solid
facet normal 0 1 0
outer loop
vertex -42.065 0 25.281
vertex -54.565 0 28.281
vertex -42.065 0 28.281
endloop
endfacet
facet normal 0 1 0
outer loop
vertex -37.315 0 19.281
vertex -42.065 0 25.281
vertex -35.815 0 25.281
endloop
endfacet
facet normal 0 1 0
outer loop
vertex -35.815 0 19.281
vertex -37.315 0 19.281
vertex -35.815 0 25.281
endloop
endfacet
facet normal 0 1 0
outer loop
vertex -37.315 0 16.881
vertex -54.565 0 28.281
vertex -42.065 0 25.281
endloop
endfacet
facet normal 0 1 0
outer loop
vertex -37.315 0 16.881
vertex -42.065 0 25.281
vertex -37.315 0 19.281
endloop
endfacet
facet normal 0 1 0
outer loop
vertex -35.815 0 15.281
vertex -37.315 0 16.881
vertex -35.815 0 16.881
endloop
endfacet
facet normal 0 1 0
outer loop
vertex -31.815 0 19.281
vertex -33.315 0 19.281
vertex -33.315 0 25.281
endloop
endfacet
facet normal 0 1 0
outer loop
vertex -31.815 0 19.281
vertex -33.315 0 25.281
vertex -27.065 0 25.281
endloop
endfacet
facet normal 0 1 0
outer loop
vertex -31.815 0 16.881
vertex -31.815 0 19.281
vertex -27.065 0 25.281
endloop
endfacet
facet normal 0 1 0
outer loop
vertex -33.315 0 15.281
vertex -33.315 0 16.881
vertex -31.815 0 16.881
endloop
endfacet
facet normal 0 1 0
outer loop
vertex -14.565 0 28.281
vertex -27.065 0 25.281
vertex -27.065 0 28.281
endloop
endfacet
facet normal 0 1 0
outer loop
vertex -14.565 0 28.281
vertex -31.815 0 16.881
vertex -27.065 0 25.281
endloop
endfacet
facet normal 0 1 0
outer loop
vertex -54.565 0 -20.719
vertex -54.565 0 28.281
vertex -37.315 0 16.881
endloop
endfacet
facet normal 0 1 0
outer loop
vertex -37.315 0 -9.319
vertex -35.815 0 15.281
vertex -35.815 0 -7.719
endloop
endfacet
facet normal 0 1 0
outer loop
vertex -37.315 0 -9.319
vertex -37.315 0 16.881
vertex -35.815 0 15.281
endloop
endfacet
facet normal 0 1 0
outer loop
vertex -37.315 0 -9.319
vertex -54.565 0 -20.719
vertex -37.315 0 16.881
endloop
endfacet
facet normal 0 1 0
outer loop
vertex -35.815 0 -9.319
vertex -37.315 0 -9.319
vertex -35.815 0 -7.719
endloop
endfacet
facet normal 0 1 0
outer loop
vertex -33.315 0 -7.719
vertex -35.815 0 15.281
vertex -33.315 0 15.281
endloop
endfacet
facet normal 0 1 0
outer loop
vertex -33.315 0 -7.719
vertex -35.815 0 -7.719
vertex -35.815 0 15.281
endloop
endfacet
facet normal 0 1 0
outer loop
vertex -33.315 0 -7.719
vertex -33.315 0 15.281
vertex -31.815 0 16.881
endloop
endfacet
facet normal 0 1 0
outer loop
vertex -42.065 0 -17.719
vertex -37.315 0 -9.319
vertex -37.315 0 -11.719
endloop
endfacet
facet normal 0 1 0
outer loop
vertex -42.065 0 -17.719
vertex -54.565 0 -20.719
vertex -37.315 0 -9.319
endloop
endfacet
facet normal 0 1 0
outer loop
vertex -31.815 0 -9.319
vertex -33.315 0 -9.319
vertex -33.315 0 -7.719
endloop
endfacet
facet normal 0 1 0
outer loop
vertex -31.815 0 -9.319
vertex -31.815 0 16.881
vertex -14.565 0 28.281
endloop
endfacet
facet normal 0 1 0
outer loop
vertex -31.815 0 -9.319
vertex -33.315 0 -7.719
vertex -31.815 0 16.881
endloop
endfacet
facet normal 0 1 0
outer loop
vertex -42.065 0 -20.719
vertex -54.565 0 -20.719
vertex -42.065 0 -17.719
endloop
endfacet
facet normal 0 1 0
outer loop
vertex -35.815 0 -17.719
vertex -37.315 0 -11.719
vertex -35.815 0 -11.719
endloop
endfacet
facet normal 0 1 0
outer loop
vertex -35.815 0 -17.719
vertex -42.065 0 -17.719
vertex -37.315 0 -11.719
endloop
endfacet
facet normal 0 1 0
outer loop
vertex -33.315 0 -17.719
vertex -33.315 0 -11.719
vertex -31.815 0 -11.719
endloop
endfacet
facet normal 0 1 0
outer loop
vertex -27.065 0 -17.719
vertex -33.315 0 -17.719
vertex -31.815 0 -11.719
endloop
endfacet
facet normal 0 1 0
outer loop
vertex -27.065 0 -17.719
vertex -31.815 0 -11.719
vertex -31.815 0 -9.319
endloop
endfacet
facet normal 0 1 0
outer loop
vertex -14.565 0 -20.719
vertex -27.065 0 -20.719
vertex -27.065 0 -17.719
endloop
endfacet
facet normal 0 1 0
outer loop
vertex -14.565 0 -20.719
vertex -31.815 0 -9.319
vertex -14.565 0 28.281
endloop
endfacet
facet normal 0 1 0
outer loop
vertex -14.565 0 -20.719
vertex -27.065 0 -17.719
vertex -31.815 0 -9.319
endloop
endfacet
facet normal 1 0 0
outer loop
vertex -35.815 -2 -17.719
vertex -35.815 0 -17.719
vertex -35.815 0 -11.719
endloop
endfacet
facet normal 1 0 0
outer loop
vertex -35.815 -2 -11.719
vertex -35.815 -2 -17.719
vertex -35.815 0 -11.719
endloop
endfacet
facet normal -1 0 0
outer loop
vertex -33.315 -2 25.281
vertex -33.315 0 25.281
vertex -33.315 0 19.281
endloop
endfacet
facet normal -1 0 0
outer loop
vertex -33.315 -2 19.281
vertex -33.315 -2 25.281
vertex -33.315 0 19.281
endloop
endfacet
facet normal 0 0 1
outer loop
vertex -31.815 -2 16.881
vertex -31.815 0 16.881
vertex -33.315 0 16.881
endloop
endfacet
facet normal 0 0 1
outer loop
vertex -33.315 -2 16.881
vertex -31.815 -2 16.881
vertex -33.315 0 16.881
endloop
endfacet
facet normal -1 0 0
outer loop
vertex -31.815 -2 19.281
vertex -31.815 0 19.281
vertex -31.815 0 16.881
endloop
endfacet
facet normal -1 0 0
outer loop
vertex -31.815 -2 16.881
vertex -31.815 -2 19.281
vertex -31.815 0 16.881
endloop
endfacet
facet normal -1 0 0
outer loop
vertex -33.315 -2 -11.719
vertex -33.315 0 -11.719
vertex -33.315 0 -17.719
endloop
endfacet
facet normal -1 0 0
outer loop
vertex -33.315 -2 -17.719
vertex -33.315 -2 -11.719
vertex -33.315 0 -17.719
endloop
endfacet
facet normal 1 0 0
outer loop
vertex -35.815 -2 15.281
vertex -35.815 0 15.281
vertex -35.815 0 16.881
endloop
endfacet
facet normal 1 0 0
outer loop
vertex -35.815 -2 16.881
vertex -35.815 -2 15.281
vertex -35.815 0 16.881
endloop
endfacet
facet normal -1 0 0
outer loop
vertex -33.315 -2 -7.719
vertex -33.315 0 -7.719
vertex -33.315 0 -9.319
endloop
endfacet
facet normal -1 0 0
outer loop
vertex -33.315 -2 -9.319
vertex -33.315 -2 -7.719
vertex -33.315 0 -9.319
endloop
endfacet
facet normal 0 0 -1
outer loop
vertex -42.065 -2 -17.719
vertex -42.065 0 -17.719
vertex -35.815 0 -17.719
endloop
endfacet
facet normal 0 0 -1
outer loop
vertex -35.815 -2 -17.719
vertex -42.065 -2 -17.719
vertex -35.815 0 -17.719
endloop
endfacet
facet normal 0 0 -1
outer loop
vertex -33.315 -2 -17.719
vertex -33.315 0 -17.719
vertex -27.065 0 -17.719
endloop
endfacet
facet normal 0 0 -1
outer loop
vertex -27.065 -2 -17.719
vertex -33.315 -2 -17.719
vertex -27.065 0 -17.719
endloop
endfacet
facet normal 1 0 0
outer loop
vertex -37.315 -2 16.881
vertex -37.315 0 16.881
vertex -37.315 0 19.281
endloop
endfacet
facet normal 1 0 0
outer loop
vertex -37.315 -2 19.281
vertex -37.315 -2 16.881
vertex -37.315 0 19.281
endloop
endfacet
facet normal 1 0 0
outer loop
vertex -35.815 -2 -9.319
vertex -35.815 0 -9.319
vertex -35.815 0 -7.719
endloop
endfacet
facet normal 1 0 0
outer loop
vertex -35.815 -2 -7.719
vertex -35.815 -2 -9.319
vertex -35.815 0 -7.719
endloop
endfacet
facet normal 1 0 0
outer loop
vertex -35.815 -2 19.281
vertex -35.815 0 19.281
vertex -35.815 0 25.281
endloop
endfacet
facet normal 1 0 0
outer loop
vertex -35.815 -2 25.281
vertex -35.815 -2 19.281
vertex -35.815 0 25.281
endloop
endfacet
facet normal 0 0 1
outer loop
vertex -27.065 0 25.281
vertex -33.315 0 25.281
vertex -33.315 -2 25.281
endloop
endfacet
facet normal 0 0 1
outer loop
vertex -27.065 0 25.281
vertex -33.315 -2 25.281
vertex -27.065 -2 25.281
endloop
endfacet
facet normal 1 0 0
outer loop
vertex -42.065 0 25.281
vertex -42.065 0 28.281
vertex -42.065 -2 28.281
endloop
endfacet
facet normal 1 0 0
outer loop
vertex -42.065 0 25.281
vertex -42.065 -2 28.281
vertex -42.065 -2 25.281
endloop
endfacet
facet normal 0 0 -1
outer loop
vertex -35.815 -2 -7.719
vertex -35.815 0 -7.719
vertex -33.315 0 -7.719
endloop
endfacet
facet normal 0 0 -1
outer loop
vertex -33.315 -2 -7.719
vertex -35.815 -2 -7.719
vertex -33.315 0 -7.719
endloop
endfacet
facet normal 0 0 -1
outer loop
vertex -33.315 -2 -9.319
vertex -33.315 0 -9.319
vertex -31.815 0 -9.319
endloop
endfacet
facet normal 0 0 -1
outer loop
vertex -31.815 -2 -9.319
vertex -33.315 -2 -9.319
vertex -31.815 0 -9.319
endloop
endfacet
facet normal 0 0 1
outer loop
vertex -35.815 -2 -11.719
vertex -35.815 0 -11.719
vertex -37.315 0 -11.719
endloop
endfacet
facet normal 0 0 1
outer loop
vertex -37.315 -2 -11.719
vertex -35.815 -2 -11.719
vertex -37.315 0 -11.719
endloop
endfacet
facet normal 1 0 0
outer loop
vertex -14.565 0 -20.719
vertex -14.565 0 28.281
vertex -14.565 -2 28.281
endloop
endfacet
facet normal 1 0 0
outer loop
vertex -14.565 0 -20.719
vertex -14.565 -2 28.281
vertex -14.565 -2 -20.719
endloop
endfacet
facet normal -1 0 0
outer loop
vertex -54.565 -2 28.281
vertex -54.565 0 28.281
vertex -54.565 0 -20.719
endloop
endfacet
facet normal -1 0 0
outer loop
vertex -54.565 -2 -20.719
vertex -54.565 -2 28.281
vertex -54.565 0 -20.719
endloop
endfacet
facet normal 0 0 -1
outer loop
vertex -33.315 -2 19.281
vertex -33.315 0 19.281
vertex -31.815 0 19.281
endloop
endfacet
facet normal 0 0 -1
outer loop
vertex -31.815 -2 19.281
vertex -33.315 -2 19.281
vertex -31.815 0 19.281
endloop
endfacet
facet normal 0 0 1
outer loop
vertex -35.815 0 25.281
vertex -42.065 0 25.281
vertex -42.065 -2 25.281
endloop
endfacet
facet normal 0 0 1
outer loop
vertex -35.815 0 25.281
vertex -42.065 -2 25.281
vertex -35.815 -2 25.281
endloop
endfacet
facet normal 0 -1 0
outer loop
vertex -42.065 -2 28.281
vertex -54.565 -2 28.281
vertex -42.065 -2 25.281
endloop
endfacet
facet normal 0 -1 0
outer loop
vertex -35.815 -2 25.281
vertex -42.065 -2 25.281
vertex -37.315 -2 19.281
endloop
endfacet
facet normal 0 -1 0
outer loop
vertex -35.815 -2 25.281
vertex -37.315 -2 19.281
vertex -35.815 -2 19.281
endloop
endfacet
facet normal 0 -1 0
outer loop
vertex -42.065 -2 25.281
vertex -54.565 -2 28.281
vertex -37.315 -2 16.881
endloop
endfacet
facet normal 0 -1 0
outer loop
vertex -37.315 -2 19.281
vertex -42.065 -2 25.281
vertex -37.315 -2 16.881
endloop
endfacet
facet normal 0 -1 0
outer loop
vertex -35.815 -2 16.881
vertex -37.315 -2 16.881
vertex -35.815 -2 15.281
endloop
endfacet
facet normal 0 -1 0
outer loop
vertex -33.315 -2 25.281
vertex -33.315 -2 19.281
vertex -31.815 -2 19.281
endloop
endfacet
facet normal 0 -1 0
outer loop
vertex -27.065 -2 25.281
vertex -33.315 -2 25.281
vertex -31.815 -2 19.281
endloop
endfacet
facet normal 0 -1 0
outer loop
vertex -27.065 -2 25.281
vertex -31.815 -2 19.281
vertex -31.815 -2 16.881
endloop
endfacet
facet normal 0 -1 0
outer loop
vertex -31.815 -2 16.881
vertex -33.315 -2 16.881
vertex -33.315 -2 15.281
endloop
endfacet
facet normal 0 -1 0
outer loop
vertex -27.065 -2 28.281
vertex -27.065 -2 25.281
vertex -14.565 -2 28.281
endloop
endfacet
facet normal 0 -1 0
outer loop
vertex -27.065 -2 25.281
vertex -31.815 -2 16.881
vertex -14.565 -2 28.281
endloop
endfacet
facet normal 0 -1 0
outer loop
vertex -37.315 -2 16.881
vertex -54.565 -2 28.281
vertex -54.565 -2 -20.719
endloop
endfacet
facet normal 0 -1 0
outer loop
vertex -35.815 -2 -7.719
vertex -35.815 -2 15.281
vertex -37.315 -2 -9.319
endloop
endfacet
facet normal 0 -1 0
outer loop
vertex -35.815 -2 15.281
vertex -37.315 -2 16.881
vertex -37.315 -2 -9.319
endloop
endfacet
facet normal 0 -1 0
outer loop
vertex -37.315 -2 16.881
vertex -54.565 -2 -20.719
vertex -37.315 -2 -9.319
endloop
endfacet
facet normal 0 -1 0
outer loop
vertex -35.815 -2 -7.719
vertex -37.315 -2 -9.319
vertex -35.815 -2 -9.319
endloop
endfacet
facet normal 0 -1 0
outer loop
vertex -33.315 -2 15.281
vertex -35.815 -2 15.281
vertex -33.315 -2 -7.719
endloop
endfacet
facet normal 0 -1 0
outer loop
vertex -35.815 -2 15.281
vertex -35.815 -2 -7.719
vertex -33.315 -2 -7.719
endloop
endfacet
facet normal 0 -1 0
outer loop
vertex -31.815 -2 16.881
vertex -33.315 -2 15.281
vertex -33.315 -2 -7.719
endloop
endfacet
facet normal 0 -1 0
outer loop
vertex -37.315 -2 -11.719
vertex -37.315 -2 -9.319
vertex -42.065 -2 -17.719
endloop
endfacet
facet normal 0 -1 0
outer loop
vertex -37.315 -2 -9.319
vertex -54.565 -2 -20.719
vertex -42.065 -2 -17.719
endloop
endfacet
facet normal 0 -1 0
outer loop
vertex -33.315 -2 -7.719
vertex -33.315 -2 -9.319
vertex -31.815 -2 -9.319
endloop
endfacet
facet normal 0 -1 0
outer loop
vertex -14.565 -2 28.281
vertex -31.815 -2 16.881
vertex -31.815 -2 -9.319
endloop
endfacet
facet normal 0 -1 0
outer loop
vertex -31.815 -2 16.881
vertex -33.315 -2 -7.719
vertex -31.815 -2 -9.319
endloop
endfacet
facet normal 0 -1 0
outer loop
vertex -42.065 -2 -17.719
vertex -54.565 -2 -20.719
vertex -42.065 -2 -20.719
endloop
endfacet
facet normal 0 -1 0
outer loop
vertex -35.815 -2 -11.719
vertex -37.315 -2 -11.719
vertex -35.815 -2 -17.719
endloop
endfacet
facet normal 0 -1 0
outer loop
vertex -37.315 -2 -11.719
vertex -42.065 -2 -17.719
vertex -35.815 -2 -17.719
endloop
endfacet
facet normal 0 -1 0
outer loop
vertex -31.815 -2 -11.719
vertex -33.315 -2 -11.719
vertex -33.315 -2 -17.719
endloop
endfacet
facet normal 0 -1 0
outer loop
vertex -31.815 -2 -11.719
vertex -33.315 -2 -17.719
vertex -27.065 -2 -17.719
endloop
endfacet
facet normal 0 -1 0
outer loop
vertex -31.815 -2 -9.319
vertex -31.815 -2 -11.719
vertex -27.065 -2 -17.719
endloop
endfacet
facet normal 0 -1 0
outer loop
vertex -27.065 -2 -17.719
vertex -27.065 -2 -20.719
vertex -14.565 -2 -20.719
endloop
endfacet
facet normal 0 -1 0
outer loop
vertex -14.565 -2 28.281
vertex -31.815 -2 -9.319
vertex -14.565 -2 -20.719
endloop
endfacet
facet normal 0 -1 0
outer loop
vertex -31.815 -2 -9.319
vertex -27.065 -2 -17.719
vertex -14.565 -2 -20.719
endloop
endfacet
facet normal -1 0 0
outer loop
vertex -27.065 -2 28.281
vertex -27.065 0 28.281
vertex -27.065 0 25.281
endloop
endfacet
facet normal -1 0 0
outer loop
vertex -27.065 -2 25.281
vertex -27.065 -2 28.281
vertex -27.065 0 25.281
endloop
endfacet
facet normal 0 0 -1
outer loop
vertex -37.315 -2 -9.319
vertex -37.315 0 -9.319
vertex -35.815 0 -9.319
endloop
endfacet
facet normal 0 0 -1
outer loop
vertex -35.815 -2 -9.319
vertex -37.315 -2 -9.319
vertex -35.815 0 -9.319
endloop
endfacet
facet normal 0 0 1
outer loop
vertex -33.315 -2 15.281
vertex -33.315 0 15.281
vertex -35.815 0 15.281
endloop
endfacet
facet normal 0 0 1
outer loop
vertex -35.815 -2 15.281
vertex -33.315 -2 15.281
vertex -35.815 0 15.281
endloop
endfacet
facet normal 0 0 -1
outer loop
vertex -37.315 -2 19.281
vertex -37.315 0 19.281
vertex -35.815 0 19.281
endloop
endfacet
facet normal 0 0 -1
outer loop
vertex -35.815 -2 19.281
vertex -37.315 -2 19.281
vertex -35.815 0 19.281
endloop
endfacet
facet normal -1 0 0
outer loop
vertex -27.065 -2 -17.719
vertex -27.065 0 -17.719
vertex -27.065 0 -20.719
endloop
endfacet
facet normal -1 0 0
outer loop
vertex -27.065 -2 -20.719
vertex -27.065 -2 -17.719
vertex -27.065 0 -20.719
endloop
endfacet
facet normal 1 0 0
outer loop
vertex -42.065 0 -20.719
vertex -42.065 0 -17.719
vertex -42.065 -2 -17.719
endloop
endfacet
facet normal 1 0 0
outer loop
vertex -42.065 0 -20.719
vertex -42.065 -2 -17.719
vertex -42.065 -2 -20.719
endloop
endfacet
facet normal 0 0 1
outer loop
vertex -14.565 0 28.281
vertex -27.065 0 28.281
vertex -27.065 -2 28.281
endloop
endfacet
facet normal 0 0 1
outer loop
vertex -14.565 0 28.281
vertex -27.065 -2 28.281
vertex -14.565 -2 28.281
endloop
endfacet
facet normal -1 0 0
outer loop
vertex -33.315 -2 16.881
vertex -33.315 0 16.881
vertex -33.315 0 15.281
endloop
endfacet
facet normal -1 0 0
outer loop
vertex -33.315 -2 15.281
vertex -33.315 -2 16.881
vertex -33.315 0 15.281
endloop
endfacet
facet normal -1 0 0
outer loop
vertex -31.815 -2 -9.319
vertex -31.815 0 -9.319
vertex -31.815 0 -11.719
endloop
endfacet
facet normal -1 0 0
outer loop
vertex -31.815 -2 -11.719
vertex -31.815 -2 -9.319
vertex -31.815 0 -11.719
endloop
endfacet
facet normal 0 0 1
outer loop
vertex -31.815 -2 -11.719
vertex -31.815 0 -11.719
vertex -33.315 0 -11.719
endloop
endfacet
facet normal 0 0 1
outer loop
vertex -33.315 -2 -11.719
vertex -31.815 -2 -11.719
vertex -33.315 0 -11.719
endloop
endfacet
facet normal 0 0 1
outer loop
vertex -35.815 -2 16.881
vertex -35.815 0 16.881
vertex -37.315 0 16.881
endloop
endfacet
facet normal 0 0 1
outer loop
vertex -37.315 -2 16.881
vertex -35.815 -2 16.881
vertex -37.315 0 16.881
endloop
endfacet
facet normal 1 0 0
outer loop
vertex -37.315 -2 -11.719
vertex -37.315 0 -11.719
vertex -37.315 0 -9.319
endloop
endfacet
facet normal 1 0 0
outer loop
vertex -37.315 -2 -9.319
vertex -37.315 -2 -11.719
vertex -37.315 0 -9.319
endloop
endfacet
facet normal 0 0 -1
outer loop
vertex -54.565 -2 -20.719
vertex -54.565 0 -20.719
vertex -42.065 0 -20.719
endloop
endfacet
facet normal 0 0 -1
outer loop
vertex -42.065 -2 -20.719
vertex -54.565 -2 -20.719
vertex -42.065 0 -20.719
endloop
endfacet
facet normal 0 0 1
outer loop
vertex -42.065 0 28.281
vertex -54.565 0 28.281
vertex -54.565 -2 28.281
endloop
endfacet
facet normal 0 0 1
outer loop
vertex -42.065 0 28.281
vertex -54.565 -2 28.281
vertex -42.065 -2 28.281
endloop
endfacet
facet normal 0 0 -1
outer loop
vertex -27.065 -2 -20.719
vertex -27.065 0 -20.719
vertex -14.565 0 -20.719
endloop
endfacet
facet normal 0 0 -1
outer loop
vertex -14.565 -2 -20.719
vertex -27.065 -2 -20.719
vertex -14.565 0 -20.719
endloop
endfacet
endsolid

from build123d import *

# Parameters (mm, degrees)
SCHIZZO1_W                   = 40
SCHIZZO1_H                   = 49
ESTRUSIONE_ESTRUSIONE2_DEPTH = 2
SCHIZZO2_W                   = 15
SCHIZZO2_H                   = 3
TAGLIO_ESTRUSIONE1_DEPTH     = 3
TAGLIO_ESTRUSIONE3_DEPTH     = 3


with BuildPart() as part:
    # Schizzo1 → Estrusione-Estrusione2 (new body)
    with BuildSketch(Plane(origin=(0, 0, 0), x_dir=(1, 0, 0), z_dir=(0, 1, 0))):
        with Locations((-34.56494914, -3.781075862)):
            Rectangle(SCHIZZO1_W, SCHIZZO1_H)
    extrude(amount=-ESTRUSIONE_ESTRUSIONE2_DEPTH)

    # Schizzo2 → Taglio-Estrusione1 (cut, through all)
    with BuildSketch(Plane(origin=(0, 0, 0), x_dir=(1, 0, 0), z_dir=(0, 1, 0))):
        with Locations((-34.56494914, -26.781075862)):
            Rectangle(SCHIZZO2_W, SCHIZZO2_H)
        with Locations((-34.56494914, 19.218924138)):
            Rectangle(SCHIZZO2_W, SCHIZZO2_H)
    extrude(amount=-TAGLIO_ESTRUSIONE1_DEPTH, mode=Mode.SUBTRACT)

    # Schizzo3 → Taglio-Estrusione3 (cut, through all)
    with BuildSketch(Plane(origin=(0, 0, 0), x_dir=(1, 0, 0), z_dir=(0, 1, 0))):
        Polygon((-35.81494914, -25.281075862), (-33.31494914, -25.281075862), (-33.31494914, -19.281075862), (-31.81494914, -19.281075862), (-31.81494914, -16.881075862), (-33.31494914, -16.881075862), (-33.31494914, -15.281075862), (-35.81494914, -15.281075862), (-35.81494914, -16.881075862), (-37.31494914, -16.881075862), (-37.31494914, -19.281075862), (-35.81494914, -19.281075862), align=None)
        Polygon((-35.81494914, 7.718924138), (-33.31494914, 7.718924138), (-33.31494914, 9.318924138), (-31.81494914, 9.318924138), (-31.81494914, 11.718924138), (-33.31494914, 11.718924138), (-33.31494914, 17.718924138), (-35.81494914, 17.718924138), (-35.81494914, 11.718924138), (-37.31494914, 11.718924138), (-37.31494914, 9.318924138), (-35.81494914, 9.318924138), align=None)
    extrude(amount=-TAGLIO_ESTRUSIONE3_DEPTH, mode=Mode.SUBTRACT)


solid = part.part
